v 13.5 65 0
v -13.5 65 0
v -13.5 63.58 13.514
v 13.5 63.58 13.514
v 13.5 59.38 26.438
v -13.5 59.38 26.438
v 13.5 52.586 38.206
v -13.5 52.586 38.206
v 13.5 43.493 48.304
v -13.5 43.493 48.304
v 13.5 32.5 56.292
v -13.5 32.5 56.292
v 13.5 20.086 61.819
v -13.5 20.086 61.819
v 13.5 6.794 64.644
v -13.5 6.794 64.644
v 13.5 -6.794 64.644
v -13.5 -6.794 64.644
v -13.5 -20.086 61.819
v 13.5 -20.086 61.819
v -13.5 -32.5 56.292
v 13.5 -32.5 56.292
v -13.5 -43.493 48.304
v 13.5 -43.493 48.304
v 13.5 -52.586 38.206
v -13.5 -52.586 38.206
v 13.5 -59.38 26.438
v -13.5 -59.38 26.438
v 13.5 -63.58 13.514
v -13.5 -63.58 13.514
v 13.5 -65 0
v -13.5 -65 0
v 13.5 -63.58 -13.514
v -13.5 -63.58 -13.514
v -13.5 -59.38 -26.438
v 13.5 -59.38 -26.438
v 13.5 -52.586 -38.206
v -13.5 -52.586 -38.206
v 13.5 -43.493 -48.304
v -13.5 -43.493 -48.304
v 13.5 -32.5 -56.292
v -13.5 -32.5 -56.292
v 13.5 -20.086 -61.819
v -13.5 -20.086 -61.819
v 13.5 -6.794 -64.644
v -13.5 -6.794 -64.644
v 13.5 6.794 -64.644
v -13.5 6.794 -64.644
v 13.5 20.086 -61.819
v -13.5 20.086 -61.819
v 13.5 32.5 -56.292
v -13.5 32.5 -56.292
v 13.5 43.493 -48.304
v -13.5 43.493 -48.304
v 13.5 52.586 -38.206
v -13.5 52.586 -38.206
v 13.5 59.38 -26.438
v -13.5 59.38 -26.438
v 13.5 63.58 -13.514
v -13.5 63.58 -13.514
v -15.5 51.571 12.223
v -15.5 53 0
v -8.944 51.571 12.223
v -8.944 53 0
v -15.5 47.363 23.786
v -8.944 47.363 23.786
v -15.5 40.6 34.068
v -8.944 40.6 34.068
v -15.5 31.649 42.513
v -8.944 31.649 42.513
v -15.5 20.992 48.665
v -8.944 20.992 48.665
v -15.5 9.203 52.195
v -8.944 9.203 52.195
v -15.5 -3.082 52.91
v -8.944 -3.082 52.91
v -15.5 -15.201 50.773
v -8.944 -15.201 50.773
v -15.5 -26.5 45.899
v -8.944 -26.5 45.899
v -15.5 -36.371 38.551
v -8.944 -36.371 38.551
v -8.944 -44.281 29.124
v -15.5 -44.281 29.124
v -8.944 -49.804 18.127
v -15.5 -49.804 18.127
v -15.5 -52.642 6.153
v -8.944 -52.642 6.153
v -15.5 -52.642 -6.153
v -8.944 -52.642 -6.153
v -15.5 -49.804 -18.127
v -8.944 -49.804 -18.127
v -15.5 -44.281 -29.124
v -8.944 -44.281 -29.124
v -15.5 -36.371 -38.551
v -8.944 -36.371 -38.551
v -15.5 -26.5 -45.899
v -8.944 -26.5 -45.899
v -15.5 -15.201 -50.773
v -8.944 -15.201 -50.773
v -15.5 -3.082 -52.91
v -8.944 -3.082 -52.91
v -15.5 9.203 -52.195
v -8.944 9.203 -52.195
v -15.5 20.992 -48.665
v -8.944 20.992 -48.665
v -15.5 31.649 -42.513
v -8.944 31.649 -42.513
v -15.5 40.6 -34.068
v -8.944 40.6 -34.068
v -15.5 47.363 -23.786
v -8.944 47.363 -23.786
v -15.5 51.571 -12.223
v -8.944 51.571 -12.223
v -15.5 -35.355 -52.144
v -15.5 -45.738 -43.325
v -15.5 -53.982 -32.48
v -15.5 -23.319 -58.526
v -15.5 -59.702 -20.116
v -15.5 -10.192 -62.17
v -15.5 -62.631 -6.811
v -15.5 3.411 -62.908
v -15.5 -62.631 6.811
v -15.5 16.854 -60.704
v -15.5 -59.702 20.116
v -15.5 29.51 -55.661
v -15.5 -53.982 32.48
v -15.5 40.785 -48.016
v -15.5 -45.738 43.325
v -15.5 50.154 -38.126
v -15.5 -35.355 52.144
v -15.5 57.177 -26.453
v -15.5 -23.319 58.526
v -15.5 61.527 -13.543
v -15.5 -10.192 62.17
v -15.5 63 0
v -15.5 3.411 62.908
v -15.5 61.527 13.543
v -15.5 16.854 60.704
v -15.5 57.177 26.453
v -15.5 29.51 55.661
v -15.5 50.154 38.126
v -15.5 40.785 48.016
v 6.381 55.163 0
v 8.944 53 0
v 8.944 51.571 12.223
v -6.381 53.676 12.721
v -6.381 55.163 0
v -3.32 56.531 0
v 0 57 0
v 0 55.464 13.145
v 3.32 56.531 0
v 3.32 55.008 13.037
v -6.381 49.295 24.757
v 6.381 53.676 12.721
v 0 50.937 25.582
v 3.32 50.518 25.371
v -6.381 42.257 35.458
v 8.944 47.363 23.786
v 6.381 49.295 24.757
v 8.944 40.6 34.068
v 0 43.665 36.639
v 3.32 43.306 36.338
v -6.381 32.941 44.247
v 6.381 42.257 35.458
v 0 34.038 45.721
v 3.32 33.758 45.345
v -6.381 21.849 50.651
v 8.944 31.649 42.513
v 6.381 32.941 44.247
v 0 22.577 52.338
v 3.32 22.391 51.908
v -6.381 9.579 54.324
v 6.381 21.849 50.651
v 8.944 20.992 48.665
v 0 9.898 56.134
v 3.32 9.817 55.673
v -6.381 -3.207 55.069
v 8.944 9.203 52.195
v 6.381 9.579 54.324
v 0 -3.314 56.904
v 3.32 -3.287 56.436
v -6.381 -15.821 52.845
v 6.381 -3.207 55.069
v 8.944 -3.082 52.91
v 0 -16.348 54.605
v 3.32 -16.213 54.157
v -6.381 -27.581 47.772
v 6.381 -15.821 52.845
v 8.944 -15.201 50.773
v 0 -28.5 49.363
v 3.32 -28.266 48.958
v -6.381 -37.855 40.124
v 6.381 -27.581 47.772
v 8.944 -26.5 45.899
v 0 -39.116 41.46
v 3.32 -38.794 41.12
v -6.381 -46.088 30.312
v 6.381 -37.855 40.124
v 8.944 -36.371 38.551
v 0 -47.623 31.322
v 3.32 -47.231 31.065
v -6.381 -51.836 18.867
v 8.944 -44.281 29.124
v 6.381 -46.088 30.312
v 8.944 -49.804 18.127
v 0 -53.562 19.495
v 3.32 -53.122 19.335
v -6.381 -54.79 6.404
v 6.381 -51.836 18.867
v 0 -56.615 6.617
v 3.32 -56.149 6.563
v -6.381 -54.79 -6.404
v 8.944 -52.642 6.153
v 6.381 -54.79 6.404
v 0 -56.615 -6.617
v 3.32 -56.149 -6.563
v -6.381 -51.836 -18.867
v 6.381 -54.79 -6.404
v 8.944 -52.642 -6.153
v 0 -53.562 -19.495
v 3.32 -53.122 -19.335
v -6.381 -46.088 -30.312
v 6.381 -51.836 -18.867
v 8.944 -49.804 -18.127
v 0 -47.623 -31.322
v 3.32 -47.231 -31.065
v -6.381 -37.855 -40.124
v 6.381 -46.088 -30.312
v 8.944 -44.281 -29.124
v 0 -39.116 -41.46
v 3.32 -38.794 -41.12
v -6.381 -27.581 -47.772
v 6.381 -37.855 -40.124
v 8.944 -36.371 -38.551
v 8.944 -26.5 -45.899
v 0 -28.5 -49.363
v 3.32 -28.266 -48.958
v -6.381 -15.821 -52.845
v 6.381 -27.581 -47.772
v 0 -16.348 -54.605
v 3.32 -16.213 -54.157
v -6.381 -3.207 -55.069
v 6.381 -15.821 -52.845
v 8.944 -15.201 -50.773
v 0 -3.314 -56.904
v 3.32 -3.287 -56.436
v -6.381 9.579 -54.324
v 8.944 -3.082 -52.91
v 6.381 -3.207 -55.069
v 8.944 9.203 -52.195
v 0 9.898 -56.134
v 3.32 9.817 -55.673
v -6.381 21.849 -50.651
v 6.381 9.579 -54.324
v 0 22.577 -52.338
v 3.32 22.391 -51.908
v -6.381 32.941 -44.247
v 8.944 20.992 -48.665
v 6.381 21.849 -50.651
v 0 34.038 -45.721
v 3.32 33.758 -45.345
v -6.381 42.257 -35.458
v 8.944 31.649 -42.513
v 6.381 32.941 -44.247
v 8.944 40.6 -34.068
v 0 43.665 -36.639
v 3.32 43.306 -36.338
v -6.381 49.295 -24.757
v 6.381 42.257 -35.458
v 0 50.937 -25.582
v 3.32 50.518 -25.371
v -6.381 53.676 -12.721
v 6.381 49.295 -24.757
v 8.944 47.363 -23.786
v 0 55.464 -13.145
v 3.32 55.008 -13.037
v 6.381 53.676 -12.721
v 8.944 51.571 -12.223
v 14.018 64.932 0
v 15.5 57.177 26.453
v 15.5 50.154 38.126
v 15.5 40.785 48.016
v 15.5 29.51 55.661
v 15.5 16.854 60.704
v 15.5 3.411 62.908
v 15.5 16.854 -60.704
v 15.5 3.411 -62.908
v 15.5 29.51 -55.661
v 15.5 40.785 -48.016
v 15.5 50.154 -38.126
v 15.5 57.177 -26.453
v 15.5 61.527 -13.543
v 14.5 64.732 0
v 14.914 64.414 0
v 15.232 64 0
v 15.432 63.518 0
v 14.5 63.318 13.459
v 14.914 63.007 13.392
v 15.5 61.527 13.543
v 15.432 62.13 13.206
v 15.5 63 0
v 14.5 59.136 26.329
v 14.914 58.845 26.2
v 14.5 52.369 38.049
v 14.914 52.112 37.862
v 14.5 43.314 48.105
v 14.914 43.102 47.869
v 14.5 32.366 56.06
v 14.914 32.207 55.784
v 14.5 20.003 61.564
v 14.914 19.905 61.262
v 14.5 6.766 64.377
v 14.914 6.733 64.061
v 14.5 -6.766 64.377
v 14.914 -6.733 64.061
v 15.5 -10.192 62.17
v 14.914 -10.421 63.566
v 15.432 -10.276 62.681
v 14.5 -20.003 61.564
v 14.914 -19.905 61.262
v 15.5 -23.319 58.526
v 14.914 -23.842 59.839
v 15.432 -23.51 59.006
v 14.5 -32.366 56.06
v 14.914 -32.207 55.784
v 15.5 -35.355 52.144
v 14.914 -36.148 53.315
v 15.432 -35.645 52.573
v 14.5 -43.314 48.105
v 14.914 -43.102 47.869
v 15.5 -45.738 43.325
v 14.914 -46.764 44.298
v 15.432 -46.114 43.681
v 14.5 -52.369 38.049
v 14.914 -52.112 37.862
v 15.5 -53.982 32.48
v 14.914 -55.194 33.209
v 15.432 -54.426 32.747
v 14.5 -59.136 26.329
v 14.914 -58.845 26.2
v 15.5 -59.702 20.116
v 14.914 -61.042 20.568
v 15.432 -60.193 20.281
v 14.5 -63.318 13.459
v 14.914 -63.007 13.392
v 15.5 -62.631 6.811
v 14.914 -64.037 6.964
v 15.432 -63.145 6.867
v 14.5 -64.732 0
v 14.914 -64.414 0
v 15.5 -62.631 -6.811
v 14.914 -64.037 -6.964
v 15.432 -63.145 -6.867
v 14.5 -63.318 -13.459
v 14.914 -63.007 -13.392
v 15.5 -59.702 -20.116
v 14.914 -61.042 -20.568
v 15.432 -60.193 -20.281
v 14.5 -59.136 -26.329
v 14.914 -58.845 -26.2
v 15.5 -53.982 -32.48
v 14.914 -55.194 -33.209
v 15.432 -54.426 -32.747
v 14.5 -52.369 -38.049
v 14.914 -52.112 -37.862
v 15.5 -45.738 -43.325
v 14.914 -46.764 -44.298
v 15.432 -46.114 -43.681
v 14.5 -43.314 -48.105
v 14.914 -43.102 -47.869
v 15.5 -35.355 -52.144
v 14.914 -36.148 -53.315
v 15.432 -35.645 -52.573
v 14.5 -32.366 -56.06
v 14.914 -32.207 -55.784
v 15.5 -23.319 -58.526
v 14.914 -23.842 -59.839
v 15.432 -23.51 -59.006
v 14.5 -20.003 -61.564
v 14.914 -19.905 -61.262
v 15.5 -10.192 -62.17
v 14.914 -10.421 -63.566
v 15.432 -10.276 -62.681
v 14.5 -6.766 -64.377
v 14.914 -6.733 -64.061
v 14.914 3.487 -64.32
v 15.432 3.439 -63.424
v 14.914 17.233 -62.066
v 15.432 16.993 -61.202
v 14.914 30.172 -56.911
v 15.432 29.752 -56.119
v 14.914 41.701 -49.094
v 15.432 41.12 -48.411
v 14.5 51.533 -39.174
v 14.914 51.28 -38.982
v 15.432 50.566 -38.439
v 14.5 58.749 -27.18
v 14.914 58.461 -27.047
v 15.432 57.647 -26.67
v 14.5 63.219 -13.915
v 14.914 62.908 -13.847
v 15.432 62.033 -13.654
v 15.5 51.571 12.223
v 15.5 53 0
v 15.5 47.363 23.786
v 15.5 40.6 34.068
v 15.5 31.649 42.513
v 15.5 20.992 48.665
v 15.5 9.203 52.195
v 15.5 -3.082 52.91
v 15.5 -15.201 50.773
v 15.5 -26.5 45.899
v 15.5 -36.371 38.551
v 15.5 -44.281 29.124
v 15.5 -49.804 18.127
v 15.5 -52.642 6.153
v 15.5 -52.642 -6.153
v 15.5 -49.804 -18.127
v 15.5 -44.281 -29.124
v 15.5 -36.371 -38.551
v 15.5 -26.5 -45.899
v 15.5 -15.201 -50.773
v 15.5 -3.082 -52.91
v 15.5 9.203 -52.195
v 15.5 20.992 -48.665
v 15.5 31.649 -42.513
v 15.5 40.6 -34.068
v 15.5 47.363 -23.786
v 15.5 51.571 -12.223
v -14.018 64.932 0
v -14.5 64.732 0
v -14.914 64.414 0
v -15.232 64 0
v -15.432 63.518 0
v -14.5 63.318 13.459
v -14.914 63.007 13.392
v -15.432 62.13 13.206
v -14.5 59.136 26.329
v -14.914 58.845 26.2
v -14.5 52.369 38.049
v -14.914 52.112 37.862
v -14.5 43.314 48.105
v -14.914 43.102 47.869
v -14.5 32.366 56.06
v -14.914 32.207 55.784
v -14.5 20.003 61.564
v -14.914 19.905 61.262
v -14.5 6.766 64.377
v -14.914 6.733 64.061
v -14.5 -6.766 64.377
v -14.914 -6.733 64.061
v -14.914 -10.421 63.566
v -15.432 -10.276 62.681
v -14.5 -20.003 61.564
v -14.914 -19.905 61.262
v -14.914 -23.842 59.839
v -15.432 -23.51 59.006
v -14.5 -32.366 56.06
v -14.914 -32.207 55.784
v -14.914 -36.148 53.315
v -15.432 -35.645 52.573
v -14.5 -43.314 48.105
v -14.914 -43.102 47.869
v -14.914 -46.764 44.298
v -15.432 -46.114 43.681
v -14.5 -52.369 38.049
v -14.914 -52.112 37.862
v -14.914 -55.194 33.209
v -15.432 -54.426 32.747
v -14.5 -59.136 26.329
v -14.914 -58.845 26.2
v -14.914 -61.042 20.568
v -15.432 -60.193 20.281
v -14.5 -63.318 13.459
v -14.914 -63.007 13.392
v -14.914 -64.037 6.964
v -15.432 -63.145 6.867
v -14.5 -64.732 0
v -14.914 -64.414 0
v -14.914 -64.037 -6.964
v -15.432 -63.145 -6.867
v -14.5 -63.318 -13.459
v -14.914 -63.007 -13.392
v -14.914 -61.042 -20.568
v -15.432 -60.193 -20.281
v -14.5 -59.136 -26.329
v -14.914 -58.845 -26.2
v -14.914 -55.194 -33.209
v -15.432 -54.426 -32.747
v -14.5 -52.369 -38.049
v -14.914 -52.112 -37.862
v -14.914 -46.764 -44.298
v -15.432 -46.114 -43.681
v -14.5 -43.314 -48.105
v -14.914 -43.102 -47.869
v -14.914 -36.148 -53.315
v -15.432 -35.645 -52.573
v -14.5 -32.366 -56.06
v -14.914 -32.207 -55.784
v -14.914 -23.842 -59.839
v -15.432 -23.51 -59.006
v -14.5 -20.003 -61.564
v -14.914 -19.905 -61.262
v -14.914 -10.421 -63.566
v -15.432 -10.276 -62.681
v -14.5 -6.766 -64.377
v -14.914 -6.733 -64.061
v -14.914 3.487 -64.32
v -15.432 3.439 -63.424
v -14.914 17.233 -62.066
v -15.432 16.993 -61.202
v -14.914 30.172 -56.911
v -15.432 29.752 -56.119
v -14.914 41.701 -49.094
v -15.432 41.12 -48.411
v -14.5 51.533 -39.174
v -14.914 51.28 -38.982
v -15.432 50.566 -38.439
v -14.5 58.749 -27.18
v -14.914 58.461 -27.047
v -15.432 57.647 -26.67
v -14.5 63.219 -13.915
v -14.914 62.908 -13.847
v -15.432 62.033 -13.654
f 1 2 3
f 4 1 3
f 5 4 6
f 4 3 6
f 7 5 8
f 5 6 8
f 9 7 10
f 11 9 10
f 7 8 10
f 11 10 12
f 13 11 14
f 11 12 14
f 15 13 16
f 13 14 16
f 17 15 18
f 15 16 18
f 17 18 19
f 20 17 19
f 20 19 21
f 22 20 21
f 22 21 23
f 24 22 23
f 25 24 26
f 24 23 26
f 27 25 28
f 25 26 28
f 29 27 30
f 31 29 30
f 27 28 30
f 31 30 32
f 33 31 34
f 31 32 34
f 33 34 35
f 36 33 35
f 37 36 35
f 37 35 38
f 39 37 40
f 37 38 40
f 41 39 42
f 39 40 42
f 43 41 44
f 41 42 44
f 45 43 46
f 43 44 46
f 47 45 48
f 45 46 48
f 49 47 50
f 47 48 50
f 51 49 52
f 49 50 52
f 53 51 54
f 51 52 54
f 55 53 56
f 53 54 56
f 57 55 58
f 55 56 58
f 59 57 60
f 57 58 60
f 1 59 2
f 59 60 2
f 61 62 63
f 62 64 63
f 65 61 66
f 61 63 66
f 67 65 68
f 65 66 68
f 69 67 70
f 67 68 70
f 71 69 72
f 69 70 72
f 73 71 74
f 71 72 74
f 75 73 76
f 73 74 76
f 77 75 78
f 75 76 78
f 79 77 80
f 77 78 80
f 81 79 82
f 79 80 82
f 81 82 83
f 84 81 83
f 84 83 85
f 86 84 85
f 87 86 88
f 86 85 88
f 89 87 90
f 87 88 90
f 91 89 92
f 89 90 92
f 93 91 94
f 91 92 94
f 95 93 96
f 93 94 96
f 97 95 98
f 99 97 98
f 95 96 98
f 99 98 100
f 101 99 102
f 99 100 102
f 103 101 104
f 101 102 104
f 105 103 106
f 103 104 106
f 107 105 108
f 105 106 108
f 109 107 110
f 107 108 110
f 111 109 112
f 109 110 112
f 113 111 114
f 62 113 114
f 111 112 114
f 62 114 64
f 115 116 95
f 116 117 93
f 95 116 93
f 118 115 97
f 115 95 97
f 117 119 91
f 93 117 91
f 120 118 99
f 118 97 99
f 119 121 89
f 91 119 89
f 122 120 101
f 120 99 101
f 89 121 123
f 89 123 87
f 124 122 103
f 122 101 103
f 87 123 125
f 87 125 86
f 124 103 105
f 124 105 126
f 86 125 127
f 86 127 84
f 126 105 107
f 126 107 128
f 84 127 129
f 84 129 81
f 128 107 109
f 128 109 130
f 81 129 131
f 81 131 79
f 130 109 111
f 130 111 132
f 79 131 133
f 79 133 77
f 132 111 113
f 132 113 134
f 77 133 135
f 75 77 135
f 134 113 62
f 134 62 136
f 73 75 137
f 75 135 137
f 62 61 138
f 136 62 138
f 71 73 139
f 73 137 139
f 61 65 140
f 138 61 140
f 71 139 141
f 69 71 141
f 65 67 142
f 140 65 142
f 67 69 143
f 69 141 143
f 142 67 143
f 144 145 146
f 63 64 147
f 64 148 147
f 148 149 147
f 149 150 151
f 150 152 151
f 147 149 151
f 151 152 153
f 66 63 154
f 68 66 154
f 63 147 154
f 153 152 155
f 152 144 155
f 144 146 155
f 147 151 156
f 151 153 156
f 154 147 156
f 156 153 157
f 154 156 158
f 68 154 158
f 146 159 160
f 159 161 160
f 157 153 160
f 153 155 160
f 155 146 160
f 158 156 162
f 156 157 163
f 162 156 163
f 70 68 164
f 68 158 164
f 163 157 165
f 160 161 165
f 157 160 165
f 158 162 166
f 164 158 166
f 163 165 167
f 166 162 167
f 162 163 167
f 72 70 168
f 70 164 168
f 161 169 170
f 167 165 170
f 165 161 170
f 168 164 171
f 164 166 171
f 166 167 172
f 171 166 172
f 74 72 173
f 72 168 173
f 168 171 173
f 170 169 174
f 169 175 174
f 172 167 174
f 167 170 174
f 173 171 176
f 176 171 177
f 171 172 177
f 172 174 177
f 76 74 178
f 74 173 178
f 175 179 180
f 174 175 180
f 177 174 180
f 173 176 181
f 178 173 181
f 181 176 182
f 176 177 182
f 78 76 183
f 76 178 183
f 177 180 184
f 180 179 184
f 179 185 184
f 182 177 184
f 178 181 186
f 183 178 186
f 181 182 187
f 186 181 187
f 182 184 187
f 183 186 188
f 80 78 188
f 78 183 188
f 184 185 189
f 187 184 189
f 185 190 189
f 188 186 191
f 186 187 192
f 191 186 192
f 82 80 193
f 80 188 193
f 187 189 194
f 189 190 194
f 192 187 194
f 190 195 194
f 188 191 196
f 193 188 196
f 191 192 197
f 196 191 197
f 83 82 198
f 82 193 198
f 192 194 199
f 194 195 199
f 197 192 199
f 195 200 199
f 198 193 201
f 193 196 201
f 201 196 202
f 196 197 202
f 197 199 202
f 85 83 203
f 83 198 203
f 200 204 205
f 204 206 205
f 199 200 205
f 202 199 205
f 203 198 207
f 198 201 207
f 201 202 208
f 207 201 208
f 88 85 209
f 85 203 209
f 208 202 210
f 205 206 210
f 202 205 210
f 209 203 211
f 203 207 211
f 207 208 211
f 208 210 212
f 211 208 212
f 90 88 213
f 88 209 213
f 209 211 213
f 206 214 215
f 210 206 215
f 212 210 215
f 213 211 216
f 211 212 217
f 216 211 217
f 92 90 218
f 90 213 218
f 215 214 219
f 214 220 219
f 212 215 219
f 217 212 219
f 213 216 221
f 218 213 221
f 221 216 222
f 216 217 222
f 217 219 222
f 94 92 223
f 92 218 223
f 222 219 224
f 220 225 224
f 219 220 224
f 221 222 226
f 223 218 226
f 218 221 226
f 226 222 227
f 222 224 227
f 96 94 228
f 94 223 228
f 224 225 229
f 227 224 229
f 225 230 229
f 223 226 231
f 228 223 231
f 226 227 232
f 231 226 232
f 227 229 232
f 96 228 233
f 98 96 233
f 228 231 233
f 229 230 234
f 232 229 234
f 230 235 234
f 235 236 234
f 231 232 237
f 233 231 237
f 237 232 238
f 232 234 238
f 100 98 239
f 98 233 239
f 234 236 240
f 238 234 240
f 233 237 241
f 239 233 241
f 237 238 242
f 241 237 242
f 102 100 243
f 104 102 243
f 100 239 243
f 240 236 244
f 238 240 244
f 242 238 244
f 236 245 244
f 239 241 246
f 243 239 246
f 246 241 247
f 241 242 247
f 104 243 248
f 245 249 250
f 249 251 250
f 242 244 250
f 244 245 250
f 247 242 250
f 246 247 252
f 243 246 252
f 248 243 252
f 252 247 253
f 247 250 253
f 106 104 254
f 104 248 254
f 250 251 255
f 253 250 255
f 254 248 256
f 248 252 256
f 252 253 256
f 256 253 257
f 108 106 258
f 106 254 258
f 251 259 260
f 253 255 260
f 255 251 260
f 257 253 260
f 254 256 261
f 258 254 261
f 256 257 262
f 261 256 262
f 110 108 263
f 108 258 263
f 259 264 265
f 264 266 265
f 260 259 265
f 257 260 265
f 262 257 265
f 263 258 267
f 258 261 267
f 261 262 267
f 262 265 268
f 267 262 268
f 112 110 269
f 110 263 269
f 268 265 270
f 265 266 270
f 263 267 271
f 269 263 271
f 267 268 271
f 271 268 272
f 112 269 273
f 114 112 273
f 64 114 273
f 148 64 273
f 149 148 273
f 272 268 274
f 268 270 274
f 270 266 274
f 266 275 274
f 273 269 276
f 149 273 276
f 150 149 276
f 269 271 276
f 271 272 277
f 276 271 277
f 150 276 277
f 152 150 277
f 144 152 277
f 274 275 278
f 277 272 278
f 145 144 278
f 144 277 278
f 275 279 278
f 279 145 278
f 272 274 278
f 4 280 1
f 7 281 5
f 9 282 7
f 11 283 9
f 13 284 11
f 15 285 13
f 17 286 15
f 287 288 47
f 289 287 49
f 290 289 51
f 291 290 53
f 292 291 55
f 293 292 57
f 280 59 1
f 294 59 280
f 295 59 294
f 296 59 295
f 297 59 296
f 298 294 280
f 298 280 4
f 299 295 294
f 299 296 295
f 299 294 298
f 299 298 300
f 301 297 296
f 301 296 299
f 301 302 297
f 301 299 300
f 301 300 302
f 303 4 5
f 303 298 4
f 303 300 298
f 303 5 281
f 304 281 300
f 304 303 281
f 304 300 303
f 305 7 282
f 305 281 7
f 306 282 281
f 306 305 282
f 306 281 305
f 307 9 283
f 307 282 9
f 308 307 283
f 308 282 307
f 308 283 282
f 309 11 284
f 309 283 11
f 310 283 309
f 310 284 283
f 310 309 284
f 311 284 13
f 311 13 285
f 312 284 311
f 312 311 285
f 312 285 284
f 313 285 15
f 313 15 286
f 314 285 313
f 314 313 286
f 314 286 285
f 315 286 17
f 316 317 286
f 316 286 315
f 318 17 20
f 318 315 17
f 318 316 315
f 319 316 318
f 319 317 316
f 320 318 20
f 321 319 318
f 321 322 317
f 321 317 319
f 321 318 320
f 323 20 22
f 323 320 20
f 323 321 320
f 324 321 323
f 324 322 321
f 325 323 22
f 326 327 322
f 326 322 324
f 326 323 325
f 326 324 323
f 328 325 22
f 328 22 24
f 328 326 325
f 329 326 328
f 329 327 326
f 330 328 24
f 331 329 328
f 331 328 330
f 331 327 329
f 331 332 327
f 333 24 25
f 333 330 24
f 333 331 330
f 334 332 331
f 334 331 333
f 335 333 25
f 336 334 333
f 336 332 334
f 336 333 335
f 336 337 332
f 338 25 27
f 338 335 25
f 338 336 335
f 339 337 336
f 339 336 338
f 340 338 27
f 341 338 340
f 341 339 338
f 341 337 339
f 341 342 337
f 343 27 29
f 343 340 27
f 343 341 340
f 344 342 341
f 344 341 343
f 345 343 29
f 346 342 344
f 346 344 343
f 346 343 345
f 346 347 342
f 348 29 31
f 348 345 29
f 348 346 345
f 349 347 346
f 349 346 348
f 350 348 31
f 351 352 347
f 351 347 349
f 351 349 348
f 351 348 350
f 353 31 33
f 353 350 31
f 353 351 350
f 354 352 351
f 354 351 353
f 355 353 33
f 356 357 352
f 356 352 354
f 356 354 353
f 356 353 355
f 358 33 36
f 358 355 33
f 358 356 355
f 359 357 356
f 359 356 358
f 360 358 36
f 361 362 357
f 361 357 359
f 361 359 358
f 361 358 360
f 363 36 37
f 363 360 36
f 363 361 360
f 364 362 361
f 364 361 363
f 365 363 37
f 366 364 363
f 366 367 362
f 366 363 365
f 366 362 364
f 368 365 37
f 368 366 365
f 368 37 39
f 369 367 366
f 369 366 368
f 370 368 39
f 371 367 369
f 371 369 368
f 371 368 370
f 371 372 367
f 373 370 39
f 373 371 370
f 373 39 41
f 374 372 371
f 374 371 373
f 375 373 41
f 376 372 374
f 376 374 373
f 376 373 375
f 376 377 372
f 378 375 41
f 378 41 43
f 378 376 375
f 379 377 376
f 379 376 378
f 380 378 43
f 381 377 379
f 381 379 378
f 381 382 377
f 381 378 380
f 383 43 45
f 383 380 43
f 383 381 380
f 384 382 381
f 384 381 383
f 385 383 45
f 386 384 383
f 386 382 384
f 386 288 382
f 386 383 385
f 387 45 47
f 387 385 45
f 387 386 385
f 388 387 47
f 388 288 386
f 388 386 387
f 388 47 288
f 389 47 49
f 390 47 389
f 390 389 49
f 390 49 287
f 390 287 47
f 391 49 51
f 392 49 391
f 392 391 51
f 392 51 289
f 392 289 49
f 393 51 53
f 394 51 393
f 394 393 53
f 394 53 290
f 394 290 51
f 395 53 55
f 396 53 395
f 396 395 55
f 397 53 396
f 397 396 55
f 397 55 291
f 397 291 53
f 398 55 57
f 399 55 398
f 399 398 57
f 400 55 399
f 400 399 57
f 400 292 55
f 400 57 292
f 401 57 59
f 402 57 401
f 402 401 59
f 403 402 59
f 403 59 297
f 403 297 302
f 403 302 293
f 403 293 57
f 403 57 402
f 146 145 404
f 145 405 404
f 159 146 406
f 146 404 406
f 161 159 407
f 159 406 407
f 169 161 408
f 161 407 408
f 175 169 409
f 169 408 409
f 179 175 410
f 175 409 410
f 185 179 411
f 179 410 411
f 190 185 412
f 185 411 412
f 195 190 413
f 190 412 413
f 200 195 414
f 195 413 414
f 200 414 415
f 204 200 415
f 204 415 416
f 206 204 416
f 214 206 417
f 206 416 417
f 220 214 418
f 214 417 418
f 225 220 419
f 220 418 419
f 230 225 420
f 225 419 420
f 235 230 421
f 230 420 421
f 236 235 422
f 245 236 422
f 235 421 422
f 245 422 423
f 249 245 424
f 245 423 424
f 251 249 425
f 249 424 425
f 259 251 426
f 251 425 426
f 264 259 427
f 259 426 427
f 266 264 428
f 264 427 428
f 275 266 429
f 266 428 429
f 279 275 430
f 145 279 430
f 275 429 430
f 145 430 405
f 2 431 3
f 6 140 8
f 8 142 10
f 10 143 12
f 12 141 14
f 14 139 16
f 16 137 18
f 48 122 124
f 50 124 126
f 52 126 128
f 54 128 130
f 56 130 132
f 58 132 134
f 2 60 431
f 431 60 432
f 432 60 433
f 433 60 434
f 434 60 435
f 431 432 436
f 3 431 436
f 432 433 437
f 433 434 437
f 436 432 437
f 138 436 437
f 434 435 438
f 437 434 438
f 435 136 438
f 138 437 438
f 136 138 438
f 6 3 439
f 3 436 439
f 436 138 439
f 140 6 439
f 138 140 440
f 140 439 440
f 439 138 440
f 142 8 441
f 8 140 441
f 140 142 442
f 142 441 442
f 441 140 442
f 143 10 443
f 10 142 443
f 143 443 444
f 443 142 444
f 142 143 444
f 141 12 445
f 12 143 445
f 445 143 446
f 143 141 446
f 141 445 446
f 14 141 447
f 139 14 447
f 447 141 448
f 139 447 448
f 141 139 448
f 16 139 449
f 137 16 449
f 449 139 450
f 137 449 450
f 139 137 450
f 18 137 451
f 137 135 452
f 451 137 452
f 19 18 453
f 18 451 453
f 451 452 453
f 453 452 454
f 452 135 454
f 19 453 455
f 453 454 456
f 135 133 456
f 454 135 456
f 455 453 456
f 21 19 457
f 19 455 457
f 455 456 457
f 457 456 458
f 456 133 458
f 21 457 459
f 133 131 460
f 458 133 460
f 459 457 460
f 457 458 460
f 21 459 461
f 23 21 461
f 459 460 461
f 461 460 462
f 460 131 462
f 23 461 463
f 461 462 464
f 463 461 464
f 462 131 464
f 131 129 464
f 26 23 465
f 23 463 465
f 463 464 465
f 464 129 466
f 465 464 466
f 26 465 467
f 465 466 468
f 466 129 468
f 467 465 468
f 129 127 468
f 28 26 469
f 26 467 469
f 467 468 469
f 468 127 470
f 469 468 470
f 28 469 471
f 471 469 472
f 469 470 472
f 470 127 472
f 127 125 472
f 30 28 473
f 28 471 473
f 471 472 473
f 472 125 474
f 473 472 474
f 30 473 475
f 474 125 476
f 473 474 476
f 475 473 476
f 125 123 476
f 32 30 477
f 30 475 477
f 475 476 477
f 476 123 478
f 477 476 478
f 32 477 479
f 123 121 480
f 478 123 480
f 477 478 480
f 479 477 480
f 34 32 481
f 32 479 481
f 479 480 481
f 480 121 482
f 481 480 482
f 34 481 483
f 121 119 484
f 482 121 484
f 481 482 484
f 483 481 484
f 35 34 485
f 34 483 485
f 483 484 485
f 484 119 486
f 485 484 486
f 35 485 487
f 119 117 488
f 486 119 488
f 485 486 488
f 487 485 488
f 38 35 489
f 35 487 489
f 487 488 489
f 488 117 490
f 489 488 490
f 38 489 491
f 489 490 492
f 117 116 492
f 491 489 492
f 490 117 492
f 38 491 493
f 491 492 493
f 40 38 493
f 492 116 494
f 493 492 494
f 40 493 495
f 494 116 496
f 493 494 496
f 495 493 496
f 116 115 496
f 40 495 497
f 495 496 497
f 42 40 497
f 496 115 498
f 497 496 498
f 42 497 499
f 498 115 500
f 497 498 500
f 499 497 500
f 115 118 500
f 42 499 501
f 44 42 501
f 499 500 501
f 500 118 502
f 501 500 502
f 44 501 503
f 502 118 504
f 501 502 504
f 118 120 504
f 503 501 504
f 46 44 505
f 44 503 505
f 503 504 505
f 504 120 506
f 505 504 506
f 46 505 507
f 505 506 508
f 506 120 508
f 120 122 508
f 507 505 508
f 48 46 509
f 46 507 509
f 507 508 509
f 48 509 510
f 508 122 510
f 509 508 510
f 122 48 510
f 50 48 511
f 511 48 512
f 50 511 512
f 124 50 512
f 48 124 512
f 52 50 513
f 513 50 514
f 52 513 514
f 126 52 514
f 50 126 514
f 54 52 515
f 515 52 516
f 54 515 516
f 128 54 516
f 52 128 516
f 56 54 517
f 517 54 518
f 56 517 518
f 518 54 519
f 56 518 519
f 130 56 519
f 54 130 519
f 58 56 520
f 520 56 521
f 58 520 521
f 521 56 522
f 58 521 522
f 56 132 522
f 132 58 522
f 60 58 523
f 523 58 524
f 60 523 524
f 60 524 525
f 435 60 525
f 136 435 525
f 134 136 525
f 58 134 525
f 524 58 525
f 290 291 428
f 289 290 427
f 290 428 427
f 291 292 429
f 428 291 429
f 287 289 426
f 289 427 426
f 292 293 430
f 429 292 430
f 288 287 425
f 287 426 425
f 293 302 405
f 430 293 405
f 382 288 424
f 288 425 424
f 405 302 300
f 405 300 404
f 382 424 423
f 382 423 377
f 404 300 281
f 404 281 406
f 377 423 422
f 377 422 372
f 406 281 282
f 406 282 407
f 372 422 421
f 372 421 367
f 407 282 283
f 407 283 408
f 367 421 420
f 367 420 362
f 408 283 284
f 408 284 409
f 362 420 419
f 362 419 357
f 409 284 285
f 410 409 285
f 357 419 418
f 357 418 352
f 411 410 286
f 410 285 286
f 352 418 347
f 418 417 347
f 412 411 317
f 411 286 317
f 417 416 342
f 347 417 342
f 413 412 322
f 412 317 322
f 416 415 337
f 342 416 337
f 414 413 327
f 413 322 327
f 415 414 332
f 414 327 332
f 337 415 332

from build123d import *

# Parameters (mm, degrees)
FILLET1_R = 2


with BuildPart() as part:
    # Sketch1 → Revolve1 (revolve)
    with BuildSketch(Plane.XY):
        with BuildLine():
            Line((15.5, 65), (-15.5, 65))
            Line((-15.5, 65), (-15.5, 53))
            Line((-15.5, 53), (-8.94427191, 53))
            ThreePointArc((-8.94427191, 53), (0, 57), (8.94427191, 53))
            Line((8.94427191, 53), (15.5, 53))
            Line((15.5, 53), (15.5, 65))
        make_face()
    revolve(axis=Axis((-15.5, 0, 0), (1, 0, 0)))

    # Fillet1
    fillet1_edges = [part.edges().sort_by_distance(p)[0] for p in [
        (15.5, -65, 0),
        (-15.5, -65, 0),
    ]]
    fillet(fillet1_edges, radius=FILLET1_R)


solid = part.part
